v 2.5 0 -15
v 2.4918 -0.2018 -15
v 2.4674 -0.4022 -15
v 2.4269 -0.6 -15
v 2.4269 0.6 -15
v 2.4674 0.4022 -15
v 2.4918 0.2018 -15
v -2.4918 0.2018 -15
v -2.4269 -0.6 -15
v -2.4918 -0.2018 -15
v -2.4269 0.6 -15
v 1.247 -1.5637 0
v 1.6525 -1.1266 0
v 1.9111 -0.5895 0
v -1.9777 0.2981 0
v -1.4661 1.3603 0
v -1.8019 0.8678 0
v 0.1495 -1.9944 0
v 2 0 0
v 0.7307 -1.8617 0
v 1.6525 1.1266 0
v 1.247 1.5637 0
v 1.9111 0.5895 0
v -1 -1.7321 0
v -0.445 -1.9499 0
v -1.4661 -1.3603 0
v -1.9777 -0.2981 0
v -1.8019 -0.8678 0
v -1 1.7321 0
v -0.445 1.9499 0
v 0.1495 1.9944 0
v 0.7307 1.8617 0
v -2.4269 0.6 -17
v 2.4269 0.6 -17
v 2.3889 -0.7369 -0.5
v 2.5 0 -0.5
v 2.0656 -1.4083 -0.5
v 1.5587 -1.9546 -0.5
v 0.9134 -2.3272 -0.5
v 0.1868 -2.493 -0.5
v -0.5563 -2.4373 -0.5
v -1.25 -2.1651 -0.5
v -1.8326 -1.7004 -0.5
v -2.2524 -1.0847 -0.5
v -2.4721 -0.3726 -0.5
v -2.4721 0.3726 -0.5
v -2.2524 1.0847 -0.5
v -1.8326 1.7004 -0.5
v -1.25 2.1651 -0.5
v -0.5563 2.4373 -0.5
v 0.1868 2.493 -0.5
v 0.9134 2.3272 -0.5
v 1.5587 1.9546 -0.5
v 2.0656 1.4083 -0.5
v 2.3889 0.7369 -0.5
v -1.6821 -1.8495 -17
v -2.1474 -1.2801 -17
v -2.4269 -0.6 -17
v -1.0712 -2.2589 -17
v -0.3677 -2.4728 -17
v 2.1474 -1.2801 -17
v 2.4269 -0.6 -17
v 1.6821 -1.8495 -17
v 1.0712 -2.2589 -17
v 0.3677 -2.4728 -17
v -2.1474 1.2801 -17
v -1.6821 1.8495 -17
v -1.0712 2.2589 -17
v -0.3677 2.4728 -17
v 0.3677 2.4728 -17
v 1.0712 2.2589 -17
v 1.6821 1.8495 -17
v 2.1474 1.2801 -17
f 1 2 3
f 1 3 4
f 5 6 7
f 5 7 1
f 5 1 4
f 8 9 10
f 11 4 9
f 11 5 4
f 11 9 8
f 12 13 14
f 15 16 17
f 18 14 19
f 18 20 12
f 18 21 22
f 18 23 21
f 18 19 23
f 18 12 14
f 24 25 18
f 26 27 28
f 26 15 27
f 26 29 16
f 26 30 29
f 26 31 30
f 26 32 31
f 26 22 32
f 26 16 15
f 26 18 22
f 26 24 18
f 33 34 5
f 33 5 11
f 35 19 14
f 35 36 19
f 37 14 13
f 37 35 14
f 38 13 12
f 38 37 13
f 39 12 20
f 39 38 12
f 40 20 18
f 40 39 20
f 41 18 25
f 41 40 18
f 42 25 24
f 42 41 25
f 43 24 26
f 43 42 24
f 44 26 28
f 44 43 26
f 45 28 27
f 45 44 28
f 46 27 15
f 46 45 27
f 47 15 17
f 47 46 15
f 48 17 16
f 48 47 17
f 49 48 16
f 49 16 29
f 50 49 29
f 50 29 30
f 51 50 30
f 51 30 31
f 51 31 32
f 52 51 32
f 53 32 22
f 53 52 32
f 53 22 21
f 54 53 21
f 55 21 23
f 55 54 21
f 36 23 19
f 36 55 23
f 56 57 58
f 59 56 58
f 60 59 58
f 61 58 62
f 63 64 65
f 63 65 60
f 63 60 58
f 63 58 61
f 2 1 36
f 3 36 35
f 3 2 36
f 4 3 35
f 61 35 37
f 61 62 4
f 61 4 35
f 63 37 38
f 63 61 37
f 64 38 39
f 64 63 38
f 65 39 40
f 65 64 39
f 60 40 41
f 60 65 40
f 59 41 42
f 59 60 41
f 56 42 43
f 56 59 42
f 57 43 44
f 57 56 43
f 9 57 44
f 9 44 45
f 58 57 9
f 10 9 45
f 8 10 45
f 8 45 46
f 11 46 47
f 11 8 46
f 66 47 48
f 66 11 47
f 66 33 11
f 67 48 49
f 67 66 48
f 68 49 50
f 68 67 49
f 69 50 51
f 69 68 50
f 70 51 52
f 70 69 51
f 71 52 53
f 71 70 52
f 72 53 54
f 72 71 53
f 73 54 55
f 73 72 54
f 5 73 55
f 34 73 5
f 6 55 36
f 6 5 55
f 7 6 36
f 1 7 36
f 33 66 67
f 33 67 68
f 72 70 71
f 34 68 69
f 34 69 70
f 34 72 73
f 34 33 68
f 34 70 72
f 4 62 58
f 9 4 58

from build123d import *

# Parameters (mm, degrees)
SKETCH2_W          = 5.424806346
SKETCH2_H          = 1.2
CUT_EXTRUDE1_DEPTH = 2


with BuildPart() as part:
    # Sketch1 → Revolve1 (revolve)
    with BuildSketch(Plane(origin=(0, 0, 0), x_dir=(0, 0, -1), z_dir=(1, 0, 0)), mode=Mode.PRIVATE) as revolve1_sk:
        Polygon((0, 0), (0, 2), (0.5, 2.5), (17, 2.5), (17, 0), align=None)
    revolve(revolve1_sk.sketch.rotate(Axis((0, 0, 0), (0, 0, -1)), 90), axis=Axis((0, 0, 0), (0, 0, -1)))

    # Sketch2 → Cut-Extrude1 (cut)
    with BuildSketch(Plane(origin=(0, 0, -17), x_dir=(-1, 0, 0), z_dir=(0, 0, -1))):
        Rectangle(SKETCH2_W, SKETCH2_H)
    extrude(amount=-CUT_EXTRUDE1_DEPTH, mode=Mode.SUBTRACT)


solid = part.part
